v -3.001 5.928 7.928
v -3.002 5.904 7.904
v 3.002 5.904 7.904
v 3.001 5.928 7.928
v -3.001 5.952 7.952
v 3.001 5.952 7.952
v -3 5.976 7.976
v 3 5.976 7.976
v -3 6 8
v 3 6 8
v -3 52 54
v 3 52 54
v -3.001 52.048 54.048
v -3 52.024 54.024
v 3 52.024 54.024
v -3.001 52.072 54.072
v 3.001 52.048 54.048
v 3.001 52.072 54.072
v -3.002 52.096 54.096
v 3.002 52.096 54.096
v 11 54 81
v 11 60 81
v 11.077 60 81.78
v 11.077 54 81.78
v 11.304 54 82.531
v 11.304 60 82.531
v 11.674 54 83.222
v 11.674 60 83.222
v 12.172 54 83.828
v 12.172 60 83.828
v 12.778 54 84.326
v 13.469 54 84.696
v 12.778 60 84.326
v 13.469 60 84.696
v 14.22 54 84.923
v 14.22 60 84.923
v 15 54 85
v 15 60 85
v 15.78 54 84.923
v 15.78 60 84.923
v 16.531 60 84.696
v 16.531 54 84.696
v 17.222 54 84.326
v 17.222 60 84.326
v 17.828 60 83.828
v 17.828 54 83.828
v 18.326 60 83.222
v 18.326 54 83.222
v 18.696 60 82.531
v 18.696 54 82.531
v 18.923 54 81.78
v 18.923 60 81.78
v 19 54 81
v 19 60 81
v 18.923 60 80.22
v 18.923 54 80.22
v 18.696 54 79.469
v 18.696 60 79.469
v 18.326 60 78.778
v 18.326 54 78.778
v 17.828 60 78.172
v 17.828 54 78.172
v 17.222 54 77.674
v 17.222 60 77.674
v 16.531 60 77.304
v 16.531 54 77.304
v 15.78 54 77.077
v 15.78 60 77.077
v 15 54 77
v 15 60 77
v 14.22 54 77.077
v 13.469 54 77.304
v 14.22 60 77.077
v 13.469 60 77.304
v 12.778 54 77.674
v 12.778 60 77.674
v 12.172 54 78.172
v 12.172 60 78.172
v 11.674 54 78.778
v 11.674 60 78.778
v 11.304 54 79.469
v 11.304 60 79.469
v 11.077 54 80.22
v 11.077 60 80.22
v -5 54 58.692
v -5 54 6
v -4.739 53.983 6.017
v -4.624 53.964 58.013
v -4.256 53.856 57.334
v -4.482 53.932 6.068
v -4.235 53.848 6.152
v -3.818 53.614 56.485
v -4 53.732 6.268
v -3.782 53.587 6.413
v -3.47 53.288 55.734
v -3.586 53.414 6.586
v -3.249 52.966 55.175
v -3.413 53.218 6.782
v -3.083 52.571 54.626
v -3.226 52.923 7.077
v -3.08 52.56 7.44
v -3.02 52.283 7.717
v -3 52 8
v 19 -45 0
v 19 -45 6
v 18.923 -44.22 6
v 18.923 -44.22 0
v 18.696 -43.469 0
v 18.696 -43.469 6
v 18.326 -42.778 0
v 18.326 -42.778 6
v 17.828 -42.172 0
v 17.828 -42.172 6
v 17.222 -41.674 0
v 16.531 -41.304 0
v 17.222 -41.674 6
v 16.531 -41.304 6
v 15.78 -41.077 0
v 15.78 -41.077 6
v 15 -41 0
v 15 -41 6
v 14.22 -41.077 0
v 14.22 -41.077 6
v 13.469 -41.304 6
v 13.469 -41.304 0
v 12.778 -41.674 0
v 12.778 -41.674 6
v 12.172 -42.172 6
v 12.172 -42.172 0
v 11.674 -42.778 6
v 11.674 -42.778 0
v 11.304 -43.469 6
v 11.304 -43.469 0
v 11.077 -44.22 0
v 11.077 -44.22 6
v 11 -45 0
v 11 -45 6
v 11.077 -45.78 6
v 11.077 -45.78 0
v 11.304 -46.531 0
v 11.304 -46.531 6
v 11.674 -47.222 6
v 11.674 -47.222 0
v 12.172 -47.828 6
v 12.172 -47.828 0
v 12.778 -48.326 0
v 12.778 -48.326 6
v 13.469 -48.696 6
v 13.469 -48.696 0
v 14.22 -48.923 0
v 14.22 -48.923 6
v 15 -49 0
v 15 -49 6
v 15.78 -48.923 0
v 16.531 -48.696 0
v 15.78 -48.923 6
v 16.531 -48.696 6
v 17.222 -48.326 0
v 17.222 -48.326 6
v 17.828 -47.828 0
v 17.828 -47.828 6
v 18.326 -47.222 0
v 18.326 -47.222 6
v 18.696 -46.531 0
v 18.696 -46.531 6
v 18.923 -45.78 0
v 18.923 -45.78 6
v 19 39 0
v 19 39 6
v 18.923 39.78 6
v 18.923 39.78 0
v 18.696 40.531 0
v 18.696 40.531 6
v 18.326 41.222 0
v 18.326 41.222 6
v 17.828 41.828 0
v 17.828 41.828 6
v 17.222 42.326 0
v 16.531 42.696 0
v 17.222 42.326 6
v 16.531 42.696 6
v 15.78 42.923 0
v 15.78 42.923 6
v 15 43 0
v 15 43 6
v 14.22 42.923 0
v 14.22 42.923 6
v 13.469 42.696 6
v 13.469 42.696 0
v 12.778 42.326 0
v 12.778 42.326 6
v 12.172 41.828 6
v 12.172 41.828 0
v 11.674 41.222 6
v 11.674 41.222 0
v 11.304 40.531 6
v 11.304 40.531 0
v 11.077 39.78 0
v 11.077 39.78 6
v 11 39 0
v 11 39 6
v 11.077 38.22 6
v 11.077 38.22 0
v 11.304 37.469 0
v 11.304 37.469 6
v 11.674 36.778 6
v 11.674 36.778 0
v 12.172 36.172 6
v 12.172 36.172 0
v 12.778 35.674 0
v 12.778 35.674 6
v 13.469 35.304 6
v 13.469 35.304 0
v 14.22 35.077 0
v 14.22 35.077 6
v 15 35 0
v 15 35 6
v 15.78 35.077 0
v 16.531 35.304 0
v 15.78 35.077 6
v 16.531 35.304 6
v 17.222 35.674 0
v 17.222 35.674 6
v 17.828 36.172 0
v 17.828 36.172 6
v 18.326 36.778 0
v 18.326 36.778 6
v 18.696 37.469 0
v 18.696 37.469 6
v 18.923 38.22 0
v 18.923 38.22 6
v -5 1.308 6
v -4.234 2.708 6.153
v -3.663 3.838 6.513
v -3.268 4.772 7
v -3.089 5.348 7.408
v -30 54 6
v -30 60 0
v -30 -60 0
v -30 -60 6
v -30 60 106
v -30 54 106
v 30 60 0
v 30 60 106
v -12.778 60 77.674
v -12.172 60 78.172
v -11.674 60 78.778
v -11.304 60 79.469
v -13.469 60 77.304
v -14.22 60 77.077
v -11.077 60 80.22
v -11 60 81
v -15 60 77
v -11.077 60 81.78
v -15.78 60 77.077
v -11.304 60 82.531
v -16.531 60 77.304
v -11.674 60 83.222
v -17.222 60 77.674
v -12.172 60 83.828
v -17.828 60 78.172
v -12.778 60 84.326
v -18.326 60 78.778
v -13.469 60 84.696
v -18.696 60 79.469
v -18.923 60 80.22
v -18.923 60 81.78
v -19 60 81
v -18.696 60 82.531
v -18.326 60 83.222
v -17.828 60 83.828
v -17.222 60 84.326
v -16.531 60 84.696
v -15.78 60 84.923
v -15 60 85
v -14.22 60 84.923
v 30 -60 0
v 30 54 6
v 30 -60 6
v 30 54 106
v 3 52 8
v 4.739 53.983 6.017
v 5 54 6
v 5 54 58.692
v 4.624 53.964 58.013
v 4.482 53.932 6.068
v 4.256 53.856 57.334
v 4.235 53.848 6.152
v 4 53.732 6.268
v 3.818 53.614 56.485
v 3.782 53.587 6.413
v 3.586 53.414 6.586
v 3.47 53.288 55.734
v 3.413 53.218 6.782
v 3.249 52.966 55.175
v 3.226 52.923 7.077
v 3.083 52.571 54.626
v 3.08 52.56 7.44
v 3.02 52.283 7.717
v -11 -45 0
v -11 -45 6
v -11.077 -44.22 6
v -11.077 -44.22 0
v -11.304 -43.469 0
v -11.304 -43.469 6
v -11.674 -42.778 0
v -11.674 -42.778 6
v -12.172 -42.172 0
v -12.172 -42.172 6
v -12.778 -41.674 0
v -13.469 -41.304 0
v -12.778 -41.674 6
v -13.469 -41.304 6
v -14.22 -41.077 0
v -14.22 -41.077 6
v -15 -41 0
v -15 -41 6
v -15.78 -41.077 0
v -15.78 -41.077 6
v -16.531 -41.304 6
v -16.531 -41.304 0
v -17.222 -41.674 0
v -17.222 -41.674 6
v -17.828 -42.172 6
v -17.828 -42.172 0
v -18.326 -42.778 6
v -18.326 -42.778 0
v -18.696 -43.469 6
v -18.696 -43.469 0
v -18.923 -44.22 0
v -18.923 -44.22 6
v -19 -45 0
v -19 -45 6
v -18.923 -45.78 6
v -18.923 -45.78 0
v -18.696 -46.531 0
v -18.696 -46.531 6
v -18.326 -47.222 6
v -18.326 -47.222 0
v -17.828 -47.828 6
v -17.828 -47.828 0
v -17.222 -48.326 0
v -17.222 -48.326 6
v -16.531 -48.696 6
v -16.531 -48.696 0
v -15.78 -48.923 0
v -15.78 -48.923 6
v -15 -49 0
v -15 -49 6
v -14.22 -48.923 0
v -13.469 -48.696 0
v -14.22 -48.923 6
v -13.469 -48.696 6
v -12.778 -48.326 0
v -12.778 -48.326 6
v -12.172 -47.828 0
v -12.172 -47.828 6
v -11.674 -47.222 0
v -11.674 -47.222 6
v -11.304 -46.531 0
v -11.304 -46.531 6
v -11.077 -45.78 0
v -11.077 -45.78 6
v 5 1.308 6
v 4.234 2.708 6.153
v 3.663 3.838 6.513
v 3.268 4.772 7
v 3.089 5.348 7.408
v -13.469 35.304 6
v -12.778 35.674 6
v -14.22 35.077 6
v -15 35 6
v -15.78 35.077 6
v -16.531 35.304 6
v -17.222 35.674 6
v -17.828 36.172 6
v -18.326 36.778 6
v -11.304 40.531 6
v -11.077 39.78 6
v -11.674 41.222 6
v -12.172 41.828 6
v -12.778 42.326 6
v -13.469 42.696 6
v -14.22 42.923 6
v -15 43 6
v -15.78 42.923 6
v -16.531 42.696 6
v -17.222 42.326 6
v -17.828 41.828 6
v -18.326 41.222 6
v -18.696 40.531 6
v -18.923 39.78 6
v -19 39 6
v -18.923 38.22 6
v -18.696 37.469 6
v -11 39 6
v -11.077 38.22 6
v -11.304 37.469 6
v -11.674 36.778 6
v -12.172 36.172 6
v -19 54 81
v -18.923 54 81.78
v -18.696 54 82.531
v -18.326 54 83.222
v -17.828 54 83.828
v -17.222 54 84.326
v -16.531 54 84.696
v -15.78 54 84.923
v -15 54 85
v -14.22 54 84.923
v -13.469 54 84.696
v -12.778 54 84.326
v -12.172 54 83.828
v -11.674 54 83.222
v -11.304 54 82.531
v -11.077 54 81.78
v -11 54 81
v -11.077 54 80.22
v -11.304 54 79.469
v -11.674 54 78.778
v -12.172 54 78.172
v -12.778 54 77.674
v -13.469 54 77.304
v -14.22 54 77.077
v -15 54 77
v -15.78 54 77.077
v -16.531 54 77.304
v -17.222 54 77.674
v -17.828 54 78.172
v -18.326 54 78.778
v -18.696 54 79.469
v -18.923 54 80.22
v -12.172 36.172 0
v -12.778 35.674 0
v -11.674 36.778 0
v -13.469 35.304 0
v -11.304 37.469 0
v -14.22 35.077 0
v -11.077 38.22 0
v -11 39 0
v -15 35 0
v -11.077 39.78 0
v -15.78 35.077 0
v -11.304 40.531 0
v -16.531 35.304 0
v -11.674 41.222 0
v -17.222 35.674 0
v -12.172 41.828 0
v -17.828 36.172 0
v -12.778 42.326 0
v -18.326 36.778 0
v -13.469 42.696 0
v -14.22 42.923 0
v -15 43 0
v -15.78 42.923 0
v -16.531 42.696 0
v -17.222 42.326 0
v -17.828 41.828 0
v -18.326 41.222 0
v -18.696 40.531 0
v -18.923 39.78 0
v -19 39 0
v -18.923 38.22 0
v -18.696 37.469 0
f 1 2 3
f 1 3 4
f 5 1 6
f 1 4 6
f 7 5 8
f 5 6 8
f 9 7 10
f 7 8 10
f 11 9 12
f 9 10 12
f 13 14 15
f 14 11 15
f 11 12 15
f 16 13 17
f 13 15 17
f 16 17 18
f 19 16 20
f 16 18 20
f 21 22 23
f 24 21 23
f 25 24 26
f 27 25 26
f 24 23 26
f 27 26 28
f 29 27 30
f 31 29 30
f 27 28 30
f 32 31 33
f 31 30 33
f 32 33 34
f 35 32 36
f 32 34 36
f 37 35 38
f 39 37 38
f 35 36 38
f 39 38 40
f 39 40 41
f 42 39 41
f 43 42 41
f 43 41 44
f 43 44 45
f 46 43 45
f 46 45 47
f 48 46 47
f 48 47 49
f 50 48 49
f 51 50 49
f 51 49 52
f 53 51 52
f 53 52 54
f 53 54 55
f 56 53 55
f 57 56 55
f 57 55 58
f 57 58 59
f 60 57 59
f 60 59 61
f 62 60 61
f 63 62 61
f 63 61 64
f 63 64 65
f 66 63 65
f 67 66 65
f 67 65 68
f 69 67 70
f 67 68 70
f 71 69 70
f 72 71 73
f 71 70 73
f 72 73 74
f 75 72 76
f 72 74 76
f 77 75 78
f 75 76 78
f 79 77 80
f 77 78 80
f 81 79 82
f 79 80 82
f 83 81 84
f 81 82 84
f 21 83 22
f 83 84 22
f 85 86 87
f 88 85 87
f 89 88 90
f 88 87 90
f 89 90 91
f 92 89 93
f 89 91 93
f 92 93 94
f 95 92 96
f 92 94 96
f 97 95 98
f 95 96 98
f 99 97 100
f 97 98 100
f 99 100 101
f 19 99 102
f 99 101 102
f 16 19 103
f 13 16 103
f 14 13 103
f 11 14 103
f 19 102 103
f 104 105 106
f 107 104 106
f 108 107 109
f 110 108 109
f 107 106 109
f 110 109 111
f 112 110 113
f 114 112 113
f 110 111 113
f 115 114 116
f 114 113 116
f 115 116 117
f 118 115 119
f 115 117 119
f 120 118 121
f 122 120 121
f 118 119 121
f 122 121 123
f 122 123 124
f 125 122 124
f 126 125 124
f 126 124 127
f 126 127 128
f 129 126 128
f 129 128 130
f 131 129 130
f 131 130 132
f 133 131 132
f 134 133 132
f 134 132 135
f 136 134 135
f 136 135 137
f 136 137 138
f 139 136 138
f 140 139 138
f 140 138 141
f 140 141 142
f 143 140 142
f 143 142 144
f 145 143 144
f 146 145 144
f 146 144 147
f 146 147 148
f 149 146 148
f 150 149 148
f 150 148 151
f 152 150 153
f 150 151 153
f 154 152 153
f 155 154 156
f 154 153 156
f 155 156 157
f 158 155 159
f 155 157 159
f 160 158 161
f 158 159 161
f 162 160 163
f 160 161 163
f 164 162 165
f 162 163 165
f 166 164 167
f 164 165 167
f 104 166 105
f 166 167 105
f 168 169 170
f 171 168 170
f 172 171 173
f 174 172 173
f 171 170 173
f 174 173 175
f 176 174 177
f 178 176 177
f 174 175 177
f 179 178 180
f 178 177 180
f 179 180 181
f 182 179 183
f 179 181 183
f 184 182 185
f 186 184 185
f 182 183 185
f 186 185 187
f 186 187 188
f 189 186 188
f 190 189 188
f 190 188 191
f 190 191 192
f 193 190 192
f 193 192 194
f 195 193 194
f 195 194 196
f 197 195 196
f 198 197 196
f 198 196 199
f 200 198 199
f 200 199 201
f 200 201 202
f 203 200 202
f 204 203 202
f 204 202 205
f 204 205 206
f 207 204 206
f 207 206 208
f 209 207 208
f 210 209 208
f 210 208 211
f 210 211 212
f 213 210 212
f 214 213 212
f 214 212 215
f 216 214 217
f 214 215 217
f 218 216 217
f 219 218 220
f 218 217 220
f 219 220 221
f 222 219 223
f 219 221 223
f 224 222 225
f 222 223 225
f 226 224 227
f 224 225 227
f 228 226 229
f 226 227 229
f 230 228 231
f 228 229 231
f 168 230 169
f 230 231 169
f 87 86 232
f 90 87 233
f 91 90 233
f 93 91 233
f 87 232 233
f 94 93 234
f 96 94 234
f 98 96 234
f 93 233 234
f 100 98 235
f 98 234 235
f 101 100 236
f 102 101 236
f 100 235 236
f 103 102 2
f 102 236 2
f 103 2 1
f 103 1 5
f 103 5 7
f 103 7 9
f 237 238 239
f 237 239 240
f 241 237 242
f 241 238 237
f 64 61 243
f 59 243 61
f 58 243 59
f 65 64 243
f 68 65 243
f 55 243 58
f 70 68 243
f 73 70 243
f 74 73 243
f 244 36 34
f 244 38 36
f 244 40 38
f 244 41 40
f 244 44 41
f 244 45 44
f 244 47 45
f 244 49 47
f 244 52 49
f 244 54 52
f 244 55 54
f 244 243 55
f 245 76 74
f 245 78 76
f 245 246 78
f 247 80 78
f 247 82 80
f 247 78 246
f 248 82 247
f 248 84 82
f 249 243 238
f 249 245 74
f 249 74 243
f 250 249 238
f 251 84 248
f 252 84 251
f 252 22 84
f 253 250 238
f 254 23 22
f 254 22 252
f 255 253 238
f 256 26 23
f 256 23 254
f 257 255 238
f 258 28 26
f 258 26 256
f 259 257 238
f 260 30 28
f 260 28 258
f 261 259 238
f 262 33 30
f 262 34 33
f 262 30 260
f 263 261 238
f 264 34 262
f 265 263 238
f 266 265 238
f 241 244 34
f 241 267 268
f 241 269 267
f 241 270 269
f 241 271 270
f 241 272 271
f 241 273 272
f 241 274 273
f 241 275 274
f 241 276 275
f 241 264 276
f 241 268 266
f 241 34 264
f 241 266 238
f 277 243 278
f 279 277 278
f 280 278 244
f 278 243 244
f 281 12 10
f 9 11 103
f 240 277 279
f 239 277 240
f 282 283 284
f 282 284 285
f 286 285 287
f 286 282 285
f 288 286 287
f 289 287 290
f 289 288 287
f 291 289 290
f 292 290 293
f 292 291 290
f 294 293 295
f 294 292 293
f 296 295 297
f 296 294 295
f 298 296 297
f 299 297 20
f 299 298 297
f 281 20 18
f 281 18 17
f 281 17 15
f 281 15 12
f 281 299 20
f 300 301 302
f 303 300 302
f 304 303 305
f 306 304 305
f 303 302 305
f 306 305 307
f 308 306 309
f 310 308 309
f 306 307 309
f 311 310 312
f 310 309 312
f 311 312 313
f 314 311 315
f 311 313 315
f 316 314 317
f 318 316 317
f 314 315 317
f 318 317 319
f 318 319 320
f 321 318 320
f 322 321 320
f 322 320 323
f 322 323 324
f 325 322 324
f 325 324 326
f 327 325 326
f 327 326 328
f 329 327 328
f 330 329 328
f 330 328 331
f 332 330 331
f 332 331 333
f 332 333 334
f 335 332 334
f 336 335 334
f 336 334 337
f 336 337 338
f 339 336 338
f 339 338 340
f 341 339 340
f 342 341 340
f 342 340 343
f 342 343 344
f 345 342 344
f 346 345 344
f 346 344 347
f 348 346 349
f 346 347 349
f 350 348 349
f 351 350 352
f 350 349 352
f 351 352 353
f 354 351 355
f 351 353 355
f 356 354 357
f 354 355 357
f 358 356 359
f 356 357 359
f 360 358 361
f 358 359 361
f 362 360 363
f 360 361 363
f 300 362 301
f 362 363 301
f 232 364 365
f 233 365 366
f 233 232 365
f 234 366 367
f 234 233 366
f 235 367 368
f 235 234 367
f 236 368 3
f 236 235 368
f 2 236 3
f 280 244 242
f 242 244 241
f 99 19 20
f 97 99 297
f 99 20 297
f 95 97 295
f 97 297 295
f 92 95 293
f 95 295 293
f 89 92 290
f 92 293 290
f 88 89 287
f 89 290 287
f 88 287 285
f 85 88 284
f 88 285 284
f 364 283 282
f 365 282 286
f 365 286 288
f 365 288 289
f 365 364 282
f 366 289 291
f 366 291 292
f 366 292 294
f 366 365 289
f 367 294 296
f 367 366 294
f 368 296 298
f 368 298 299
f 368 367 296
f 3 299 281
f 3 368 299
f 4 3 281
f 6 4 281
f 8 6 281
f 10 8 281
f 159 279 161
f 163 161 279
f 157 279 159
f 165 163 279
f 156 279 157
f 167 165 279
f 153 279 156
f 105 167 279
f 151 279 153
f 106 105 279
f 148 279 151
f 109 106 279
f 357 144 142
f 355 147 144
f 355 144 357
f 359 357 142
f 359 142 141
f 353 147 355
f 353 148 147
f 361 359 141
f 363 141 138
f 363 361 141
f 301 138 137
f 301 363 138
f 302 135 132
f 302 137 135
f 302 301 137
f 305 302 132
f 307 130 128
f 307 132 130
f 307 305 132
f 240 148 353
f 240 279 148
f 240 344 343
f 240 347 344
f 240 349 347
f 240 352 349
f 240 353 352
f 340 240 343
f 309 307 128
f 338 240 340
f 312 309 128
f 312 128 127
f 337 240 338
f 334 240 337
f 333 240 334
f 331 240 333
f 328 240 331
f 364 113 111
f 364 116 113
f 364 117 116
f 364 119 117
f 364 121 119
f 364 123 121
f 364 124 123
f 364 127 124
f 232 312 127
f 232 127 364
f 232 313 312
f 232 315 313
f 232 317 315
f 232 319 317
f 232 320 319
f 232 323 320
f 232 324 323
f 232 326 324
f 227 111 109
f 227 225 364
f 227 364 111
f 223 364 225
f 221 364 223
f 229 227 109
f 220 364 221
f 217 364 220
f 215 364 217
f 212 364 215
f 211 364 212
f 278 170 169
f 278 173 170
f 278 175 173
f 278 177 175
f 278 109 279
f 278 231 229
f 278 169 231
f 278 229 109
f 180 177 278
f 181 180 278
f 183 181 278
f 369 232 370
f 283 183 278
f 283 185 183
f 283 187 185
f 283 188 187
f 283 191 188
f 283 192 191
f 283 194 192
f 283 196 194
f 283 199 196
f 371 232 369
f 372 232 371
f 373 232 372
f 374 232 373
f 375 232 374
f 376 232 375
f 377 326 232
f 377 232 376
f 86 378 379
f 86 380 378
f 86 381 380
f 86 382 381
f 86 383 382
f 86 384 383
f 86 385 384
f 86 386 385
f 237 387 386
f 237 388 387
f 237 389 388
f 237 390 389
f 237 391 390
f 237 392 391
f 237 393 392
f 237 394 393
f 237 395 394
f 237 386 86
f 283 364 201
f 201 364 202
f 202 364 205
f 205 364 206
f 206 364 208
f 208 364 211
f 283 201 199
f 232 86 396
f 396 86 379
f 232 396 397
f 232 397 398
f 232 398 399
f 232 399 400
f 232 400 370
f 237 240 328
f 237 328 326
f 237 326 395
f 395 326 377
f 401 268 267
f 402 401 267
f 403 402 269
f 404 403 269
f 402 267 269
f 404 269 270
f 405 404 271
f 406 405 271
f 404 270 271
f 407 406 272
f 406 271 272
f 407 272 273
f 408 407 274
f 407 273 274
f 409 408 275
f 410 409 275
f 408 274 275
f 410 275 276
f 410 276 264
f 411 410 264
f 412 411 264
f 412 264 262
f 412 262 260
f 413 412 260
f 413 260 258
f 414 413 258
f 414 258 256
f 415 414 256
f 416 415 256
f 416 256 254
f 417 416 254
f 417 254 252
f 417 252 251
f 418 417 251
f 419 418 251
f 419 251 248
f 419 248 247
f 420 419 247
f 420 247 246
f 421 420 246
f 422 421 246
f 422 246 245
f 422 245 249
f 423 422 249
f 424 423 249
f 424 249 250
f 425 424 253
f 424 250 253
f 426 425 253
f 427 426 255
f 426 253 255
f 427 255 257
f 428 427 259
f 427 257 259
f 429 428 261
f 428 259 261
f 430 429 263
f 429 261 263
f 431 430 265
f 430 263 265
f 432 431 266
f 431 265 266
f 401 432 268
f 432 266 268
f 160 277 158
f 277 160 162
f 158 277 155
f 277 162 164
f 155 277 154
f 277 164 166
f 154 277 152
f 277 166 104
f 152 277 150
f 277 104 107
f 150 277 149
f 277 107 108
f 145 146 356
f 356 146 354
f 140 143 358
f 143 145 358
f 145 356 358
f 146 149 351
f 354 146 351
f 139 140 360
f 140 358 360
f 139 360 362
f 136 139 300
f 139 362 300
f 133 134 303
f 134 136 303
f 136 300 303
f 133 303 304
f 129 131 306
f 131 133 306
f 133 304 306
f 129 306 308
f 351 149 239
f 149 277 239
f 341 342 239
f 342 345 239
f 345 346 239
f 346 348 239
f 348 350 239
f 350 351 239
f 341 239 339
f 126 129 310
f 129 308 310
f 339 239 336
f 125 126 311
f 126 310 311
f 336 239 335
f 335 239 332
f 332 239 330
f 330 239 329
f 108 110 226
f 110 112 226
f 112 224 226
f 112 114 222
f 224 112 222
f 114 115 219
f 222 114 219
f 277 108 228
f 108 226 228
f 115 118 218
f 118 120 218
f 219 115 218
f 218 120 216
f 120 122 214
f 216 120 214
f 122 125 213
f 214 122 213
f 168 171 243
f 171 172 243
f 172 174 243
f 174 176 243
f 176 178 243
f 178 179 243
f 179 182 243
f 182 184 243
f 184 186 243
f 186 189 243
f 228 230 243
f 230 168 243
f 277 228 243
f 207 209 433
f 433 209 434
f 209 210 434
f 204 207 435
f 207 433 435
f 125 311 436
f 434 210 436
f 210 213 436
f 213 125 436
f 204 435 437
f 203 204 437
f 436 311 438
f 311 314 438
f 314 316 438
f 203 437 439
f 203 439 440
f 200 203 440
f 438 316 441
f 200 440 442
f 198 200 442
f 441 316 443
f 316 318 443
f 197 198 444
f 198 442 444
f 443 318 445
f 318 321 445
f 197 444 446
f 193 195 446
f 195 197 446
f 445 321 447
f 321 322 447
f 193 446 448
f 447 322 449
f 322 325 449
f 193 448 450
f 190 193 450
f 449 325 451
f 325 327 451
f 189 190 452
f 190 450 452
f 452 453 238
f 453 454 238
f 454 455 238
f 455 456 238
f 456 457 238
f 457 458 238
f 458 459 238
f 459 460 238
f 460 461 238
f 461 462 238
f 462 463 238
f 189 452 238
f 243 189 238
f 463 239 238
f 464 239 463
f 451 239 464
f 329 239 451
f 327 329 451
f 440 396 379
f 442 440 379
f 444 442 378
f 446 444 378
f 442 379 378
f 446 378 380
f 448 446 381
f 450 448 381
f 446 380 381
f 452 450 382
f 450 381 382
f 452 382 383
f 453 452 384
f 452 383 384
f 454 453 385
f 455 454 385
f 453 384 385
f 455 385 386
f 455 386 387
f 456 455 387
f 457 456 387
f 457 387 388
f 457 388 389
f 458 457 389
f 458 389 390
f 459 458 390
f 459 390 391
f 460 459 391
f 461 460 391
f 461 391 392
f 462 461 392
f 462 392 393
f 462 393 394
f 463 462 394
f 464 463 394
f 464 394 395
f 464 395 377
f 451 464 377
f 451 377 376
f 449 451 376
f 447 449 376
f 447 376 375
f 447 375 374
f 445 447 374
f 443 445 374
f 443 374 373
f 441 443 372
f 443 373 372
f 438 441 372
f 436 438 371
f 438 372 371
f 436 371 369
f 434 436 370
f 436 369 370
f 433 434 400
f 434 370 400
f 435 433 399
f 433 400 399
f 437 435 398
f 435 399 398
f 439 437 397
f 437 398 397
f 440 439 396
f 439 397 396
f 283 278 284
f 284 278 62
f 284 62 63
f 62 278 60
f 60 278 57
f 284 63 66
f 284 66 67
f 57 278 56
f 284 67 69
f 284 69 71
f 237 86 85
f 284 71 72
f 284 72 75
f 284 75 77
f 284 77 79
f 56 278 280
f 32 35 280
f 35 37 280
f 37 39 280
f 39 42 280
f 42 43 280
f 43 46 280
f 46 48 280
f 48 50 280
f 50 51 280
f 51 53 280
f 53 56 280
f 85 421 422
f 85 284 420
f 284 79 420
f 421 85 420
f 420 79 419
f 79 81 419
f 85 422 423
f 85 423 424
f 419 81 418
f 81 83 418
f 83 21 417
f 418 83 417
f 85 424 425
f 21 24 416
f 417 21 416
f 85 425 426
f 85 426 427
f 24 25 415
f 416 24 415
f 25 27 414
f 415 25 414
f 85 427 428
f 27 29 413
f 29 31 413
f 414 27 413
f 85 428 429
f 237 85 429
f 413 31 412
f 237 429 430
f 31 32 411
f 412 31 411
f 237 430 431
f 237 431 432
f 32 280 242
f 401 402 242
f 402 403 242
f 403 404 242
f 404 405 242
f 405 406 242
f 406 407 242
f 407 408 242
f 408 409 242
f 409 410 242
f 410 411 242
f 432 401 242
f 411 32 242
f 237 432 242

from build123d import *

# Parameters (mm, degrees)
SKETCH1_W           = 120
SKETCH1_H           = 60
BOSS_EXTRUDE1_DEPTH = 6
SKETCH2_W           = 60
SKETCH2_H           = 100
BOSS_EXTRUDE2_DEPTH = 6
BOSS_EXTRUDE3_DEPTH = 3
SKETCH5_R           = 4
CUT_EXTRUDE2_DEPTH  = 62
SKETCH6_R           = 4
CUT_EXTRUDE3_DEPTH  = 62
FILLET1_R           = 2
FILLET3_R           = 6.5


with BuildPart() as part:
    # Sketch1 → Boss-Extrude1 (new body)
    with BuildSketch(Plane(origin=(0, 0, 0), x_dir=(0, 1, 0), z_dir=(0, 0, 1))):
        Rectangle(SKETCH1_W, SKETCH1_H)
    extrude(amount=BOSS_EXTRUDE1_DEPTH)

    # Sketch2 → Boss-Extrude2 (add)
    with BuildSketch(Plane(origin=(0, 60, 0), x_dir=(-1, 0, 0), z_dir=(0, 1, 0))):
        with Locations((0, 56)):
            Rectangle(SKETCH2_W, SKETCH2_H)
    extrude(amount=-BOSS_EXTRUDE2_DEPTH)

    # Sketch4 → Boss-Extrude3 (add, symmetric)
    with BuildSketch(Plane.YZ):
        Polygon((54, 6), (4, 6), (54, 56), align=None)
    extrude(amount=BOSS_EXTRUDE3_DEPTH, both=True)

    # Sketch5 → Cut-Extrude2 (cut)
    with BuildSketch(Plane(origin=(0, 60, 0), x_dir=(-1, 0, 0), z_dir=(0, 1, 0))):
        with Locations((-15, 81)):
            Circle(SKETCH5_R)
        with Locations((15, 81)):
            Circle(SKETCH5_R)
    extrude(amount=-CUT_EXTRUDE2_DEPTH, mode=Mode.SUBTRACT)

    # Sketch6 → Cut-Extrude3 (cut)
    with BuildSketch(Plane.XY.offset(6)):
        with Locations((-15, -45)):
            Circle(SKETCH6_R)
        with Locations((15, -45)):
            Circle(SKETCH6_R)
        with Locations((-15, 39)):
            Circle(SKETCH6_R)
        with Locations((15, 39)):
            Circle(SKETCH6_R)
    extrude(amount=-CUT_EXTRUDE3_DEPTH, mode=Mode.SUBTRACT)

    # Fillet1
    fillet1_edges = [part.edges().sort_by_distance(p)[0] for p in [
        (-3, 54, 31),
        (-3, 29, 6),
        (3, 54, 31),
        (3, 29, 6),
    ]]
    fillet(fillet1_edges, radius=FILLET1_R)

    # Fillet3
    fillet3_edges = [part.edges().sort_by_distance(p)[0] for p in [
        (0, 4, 6),
        (0, 54, 56),
    ]]
    fillet(fillet3_edges, radius=FILLET3_R)


solid = part.part
